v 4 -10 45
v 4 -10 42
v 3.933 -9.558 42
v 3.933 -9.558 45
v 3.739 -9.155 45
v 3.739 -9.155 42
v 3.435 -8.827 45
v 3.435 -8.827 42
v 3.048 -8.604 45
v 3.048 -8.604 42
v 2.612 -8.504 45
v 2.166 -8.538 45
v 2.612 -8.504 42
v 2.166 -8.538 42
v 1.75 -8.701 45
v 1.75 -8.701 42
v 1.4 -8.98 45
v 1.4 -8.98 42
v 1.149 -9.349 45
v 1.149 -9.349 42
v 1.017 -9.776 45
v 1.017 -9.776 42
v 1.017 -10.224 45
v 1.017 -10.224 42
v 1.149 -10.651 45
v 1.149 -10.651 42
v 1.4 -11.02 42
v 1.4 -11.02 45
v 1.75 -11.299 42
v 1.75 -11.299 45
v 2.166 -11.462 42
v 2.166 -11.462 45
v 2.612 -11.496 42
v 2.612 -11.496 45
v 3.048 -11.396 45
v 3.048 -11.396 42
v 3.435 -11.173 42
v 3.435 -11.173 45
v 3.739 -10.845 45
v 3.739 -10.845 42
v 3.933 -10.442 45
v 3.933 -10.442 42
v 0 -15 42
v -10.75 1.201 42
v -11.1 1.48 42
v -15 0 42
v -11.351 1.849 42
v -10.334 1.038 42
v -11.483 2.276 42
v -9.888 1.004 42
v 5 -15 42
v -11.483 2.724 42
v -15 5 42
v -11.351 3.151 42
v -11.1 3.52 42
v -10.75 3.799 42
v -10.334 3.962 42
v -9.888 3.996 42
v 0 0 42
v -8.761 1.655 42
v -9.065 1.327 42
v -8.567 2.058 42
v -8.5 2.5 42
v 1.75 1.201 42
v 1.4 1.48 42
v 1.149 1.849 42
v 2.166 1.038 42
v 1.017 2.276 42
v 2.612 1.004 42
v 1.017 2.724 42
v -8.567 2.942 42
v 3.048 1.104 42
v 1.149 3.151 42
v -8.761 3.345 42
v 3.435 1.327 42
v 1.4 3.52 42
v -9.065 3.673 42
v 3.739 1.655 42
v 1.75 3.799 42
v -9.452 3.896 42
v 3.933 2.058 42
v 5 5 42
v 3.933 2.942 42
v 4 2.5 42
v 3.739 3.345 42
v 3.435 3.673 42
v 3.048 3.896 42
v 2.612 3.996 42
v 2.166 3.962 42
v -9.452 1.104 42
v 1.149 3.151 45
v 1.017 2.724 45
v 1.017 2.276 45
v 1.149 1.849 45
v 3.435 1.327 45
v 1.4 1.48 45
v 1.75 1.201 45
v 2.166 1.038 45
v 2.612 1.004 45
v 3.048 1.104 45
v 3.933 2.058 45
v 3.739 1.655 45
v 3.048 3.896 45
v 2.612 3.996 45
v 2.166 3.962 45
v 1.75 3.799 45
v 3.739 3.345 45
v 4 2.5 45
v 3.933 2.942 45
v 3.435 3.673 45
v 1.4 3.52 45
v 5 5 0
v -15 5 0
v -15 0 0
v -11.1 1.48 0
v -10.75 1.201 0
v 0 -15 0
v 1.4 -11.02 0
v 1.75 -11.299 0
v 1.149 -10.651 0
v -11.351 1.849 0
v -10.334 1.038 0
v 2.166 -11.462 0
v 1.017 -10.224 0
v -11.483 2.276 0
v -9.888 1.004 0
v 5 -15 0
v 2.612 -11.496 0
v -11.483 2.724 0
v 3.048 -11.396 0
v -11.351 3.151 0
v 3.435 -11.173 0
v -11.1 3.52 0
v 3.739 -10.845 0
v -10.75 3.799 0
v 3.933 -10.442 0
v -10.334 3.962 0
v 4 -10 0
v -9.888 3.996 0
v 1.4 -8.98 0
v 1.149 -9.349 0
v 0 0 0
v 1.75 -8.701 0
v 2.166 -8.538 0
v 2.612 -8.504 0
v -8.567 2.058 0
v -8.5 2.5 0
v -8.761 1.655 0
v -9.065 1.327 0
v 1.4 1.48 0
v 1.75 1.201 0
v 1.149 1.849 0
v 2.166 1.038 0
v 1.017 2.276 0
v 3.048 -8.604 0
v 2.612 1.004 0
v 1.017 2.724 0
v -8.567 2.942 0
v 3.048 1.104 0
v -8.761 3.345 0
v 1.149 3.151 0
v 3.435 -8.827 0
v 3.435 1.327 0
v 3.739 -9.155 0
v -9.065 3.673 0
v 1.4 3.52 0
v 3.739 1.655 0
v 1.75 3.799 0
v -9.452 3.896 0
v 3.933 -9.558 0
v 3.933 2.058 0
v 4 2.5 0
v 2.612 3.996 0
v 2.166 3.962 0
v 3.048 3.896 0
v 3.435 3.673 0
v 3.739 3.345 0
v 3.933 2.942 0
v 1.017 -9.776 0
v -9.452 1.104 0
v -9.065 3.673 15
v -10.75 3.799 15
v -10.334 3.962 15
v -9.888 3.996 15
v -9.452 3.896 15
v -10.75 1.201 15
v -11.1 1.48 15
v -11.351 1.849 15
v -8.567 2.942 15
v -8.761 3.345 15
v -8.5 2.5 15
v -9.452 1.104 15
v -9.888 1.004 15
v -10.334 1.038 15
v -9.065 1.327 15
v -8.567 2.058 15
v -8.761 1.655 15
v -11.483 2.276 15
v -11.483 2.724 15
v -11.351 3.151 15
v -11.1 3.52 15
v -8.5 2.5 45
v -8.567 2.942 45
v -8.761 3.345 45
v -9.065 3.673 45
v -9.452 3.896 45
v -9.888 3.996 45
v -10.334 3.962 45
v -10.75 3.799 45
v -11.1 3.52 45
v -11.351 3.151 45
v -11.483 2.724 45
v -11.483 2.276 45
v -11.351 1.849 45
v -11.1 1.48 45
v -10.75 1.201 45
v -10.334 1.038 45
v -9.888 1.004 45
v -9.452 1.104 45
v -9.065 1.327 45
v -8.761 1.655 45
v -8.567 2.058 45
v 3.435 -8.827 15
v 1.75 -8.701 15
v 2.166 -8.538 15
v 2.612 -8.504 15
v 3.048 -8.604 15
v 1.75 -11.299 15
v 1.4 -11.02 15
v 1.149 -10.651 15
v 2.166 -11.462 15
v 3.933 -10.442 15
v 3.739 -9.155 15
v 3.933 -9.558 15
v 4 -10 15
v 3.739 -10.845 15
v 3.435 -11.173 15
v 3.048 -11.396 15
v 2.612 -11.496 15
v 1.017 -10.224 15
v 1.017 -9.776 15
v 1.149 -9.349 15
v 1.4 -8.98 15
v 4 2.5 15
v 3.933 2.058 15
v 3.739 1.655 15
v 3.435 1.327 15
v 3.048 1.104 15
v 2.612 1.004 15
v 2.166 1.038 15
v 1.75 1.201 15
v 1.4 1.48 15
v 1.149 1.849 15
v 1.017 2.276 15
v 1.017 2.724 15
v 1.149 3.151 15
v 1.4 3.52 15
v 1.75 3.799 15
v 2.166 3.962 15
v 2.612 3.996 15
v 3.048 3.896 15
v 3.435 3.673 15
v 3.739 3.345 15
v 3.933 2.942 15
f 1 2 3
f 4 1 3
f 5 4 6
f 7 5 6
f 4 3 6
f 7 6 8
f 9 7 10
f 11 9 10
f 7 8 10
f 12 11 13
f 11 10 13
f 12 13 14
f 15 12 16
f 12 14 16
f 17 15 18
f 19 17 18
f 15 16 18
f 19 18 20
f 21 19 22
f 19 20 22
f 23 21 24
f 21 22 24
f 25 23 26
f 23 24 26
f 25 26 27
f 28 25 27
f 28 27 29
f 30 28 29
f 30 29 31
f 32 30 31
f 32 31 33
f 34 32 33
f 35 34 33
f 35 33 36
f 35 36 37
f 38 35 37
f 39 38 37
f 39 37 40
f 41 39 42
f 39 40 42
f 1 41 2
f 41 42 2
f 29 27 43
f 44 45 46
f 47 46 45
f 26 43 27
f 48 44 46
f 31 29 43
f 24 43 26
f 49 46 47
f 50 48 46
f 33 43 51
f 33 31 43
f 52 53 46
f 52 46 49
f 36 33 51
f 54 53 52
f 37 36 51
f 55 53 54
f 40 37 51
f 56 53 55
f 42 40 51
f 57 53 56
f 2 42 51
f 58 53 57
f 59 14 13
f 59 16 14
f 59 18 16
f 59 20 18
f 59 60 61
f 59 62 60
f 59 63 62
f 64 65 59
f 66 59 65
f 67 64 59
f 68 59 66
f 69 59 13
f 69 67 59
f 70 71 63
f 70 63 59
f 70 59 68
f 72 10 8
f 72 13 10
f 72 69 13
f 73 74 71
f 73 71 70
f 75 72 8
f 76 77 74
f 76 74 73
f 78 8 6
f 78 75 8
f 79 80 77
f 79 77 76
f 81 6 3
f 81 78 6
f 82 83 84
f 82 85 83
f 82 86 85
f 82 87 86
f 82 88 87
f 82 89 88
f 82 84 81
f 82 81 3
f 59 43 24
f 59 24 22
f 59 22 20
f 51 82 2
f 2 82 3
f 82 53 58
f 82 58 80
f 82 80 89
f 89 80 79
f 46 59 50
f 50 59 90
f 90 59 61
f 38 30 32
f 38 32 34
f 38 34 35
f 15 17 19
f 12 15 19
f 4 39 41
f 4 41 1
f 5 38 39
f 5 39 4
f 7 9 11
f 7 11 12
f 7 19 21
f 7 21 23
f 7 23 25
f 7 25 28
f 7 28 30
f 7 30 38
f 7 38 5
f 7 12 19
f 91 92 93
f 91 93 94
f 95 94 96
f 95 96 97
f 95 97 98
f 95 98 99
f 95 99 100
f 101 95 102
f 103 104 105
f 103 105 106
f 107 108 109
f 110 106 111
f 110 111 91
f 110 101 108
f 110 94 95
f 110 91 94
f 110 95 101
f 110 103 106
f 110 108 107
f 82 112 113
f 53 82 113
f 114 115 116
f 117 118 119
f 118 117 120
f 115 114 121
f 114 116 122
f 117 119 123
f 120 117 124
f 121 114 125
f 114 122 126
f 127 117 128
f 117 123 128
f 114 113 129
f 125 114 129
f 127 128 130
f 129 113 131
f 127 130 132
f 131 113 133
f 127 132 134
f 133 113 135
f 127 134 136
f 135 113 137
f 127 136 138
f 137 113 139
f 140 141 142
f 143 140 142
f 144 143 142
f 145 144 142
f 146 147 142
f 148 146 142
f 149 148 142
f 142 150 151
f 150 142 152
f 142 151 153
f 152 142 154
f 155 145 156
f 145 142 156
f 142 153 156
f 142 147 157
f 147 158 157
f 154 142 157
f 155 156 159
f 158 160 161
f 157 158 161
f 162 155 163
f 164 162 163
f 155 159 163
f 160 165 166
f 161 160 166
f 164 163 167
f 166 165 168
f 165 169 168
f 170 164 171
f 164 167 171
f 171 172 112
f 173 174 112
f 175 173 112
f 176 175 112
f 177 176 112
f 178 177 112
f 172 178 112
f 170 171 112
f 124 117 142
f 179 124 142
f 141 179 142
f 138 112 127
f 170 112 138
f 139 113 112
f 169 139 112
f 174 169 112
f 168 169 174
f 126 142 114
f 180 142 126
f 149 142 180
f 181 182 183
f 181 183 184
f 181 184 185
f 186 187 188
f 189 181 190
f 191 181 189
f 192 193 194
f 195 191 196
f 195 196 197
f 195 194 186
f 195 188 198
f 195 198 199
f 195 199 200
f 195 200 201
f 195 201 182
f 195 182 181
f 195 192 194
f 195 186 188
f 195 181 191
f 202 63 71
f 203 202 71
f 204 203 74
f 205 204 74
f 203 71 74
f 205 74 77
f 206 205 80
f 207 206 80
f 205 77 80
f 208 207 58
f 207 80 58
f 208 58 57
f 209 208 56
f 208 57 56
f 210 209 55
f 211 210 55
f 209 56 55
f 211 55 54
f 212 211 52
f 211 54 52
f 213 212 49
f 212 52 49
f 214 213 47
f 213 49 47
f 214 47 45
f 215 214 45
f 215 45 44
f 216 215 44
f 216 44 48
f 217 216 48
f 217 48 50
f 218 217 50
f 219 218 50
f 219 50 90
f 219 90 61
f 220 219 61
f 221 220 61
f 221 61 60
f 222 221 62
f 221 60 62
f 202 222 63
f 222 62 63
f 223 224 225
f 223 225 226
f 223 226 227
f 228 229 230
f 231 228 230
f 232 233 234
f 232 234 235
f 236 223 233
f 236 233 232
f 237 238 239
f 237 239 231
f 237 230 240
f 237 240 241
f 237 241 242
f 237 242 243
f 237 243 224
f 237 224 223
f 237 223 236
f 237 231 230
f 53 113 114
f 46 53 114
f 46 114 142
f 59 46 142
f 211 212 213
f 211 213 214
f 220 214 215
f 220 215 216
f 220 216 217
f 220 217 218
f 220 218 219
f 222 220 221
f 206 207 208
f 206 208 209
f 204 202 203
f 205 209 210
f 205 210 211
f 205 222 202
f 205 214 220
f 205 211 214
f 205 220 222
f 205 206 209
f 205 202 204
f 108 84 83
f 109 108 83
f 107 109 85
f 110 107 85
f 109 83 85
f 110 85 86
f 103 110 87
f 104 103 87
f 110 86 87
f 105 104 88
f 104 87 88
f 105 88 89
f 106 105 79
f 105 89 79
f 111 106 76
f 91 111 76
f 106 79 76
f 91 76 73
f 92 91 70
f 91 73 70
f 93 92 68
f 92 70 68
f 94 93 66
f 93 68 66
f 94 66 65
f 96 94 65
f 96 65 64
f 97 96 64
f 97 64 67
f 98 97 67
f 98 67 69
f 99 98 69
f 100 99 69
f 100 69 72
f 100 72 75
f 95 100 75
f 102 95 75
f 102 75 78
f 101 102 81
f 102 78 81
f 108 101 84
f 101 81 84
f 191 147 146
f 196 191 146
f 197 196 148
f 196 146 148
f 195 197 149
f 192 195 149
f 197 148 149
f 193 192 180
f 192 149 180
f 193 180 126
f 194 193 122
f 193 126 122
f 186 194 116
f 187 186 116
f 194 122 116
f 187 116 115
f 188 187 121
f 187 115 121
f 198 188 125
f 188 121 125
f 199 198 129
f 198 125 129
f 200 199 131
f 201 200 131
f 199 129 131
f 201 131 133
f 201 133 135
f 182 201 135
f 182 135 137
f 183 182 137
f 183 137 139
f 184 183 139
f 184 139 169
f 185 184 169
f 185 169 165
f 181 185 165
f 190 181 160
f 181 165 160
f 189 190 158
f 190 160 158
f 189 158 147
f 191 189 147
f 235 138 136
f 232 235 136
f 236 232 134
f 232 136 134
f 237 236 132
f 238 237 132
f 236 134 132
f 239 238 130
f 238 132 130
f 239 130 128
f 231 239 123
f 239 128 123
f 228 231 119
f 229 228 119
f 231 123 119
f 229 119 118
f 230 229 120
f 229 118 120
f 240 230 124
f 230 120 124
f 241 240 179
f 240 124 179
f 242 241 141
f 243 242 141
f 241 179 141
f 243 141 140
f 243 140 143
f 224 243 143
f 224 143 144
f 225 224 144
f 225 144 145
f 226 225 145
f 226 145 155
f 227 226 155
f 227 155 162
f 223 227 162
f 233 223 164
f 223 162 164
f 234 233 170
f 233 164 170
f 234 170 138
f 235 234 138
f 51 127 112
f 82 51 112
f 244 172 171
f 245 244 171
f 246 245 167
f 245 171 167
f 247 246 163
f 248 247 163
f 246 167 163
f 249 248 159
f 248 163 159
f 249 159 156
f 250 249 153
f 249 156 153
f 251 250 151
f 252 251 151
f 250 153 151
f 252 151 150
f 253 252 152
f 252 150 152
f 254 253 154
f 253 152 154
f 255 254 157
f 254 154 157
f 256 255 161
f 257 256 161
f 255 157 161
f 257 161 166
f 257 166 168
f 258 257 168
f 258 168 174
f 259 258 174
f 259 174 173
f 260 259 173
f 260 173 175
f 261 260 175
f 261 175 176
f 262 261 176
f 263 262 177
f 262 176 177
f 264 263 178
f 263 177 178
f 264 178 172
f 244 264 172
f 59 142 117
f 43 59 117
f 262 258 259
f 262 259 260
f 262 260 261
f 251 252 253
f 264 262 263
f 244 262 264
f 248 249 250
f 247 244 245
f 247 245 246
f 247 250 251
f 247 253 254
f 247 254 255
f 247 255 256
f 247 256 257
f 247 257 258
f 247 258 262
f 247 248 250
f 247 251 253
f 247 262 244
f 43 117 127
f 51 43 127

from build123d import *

# Parameters (mm, degrees)
PAD_DEPTH    = 42
SKETCH001_R  = 1.5
PAD001_DEPTH = 3
SKETCH002_R  = 1.5
POCKET_DEPTH = 15


with BuildPart() as part:
    # Sketch → Pad (new body)
    with BuildSketch(Plane.XY):
        Polygon((0, 0), (0, -15), (5, -15), (5, 5), (-15, 5), (-15, 0), align=None)
    extrude(amount=PAD_DEPTH)

    # Sketch001 (on Face8 of Pad) → Pad001 (join)
    with BuildSketch(Plane.XY.offset(42)):
        with Locations((-10, 2.5)):
            Circle(SKETCH001_R)
        with Locations((2.5, 2.5)):
            Circle(SKETCH001_R)
        with Locations((2.5, -10)):
            Circle(SKETCH001_R)
    extrude(amount=PAD001_DEPTH)

    # Sketch002 (on Face4 of Pad001) → Pocket (cut)
    with BuildSketch(Plane(origin=(0, 0, 0), x_dir=(1, 0, 0), z_dir=(0, 0, -1))):
        with Locations((2.5, -2.5)):
            Circle(SKETCH002_R)
        with Locations((2.5, 10)):
            Circle(SKETCH002_R)
        with Locations((-10, -2.5)):
            Circle(SKETCH002_R)
    extrude(amount=-POCKET_DEPTH, mode=Mode.SUBTRACT)


solid = part.part
